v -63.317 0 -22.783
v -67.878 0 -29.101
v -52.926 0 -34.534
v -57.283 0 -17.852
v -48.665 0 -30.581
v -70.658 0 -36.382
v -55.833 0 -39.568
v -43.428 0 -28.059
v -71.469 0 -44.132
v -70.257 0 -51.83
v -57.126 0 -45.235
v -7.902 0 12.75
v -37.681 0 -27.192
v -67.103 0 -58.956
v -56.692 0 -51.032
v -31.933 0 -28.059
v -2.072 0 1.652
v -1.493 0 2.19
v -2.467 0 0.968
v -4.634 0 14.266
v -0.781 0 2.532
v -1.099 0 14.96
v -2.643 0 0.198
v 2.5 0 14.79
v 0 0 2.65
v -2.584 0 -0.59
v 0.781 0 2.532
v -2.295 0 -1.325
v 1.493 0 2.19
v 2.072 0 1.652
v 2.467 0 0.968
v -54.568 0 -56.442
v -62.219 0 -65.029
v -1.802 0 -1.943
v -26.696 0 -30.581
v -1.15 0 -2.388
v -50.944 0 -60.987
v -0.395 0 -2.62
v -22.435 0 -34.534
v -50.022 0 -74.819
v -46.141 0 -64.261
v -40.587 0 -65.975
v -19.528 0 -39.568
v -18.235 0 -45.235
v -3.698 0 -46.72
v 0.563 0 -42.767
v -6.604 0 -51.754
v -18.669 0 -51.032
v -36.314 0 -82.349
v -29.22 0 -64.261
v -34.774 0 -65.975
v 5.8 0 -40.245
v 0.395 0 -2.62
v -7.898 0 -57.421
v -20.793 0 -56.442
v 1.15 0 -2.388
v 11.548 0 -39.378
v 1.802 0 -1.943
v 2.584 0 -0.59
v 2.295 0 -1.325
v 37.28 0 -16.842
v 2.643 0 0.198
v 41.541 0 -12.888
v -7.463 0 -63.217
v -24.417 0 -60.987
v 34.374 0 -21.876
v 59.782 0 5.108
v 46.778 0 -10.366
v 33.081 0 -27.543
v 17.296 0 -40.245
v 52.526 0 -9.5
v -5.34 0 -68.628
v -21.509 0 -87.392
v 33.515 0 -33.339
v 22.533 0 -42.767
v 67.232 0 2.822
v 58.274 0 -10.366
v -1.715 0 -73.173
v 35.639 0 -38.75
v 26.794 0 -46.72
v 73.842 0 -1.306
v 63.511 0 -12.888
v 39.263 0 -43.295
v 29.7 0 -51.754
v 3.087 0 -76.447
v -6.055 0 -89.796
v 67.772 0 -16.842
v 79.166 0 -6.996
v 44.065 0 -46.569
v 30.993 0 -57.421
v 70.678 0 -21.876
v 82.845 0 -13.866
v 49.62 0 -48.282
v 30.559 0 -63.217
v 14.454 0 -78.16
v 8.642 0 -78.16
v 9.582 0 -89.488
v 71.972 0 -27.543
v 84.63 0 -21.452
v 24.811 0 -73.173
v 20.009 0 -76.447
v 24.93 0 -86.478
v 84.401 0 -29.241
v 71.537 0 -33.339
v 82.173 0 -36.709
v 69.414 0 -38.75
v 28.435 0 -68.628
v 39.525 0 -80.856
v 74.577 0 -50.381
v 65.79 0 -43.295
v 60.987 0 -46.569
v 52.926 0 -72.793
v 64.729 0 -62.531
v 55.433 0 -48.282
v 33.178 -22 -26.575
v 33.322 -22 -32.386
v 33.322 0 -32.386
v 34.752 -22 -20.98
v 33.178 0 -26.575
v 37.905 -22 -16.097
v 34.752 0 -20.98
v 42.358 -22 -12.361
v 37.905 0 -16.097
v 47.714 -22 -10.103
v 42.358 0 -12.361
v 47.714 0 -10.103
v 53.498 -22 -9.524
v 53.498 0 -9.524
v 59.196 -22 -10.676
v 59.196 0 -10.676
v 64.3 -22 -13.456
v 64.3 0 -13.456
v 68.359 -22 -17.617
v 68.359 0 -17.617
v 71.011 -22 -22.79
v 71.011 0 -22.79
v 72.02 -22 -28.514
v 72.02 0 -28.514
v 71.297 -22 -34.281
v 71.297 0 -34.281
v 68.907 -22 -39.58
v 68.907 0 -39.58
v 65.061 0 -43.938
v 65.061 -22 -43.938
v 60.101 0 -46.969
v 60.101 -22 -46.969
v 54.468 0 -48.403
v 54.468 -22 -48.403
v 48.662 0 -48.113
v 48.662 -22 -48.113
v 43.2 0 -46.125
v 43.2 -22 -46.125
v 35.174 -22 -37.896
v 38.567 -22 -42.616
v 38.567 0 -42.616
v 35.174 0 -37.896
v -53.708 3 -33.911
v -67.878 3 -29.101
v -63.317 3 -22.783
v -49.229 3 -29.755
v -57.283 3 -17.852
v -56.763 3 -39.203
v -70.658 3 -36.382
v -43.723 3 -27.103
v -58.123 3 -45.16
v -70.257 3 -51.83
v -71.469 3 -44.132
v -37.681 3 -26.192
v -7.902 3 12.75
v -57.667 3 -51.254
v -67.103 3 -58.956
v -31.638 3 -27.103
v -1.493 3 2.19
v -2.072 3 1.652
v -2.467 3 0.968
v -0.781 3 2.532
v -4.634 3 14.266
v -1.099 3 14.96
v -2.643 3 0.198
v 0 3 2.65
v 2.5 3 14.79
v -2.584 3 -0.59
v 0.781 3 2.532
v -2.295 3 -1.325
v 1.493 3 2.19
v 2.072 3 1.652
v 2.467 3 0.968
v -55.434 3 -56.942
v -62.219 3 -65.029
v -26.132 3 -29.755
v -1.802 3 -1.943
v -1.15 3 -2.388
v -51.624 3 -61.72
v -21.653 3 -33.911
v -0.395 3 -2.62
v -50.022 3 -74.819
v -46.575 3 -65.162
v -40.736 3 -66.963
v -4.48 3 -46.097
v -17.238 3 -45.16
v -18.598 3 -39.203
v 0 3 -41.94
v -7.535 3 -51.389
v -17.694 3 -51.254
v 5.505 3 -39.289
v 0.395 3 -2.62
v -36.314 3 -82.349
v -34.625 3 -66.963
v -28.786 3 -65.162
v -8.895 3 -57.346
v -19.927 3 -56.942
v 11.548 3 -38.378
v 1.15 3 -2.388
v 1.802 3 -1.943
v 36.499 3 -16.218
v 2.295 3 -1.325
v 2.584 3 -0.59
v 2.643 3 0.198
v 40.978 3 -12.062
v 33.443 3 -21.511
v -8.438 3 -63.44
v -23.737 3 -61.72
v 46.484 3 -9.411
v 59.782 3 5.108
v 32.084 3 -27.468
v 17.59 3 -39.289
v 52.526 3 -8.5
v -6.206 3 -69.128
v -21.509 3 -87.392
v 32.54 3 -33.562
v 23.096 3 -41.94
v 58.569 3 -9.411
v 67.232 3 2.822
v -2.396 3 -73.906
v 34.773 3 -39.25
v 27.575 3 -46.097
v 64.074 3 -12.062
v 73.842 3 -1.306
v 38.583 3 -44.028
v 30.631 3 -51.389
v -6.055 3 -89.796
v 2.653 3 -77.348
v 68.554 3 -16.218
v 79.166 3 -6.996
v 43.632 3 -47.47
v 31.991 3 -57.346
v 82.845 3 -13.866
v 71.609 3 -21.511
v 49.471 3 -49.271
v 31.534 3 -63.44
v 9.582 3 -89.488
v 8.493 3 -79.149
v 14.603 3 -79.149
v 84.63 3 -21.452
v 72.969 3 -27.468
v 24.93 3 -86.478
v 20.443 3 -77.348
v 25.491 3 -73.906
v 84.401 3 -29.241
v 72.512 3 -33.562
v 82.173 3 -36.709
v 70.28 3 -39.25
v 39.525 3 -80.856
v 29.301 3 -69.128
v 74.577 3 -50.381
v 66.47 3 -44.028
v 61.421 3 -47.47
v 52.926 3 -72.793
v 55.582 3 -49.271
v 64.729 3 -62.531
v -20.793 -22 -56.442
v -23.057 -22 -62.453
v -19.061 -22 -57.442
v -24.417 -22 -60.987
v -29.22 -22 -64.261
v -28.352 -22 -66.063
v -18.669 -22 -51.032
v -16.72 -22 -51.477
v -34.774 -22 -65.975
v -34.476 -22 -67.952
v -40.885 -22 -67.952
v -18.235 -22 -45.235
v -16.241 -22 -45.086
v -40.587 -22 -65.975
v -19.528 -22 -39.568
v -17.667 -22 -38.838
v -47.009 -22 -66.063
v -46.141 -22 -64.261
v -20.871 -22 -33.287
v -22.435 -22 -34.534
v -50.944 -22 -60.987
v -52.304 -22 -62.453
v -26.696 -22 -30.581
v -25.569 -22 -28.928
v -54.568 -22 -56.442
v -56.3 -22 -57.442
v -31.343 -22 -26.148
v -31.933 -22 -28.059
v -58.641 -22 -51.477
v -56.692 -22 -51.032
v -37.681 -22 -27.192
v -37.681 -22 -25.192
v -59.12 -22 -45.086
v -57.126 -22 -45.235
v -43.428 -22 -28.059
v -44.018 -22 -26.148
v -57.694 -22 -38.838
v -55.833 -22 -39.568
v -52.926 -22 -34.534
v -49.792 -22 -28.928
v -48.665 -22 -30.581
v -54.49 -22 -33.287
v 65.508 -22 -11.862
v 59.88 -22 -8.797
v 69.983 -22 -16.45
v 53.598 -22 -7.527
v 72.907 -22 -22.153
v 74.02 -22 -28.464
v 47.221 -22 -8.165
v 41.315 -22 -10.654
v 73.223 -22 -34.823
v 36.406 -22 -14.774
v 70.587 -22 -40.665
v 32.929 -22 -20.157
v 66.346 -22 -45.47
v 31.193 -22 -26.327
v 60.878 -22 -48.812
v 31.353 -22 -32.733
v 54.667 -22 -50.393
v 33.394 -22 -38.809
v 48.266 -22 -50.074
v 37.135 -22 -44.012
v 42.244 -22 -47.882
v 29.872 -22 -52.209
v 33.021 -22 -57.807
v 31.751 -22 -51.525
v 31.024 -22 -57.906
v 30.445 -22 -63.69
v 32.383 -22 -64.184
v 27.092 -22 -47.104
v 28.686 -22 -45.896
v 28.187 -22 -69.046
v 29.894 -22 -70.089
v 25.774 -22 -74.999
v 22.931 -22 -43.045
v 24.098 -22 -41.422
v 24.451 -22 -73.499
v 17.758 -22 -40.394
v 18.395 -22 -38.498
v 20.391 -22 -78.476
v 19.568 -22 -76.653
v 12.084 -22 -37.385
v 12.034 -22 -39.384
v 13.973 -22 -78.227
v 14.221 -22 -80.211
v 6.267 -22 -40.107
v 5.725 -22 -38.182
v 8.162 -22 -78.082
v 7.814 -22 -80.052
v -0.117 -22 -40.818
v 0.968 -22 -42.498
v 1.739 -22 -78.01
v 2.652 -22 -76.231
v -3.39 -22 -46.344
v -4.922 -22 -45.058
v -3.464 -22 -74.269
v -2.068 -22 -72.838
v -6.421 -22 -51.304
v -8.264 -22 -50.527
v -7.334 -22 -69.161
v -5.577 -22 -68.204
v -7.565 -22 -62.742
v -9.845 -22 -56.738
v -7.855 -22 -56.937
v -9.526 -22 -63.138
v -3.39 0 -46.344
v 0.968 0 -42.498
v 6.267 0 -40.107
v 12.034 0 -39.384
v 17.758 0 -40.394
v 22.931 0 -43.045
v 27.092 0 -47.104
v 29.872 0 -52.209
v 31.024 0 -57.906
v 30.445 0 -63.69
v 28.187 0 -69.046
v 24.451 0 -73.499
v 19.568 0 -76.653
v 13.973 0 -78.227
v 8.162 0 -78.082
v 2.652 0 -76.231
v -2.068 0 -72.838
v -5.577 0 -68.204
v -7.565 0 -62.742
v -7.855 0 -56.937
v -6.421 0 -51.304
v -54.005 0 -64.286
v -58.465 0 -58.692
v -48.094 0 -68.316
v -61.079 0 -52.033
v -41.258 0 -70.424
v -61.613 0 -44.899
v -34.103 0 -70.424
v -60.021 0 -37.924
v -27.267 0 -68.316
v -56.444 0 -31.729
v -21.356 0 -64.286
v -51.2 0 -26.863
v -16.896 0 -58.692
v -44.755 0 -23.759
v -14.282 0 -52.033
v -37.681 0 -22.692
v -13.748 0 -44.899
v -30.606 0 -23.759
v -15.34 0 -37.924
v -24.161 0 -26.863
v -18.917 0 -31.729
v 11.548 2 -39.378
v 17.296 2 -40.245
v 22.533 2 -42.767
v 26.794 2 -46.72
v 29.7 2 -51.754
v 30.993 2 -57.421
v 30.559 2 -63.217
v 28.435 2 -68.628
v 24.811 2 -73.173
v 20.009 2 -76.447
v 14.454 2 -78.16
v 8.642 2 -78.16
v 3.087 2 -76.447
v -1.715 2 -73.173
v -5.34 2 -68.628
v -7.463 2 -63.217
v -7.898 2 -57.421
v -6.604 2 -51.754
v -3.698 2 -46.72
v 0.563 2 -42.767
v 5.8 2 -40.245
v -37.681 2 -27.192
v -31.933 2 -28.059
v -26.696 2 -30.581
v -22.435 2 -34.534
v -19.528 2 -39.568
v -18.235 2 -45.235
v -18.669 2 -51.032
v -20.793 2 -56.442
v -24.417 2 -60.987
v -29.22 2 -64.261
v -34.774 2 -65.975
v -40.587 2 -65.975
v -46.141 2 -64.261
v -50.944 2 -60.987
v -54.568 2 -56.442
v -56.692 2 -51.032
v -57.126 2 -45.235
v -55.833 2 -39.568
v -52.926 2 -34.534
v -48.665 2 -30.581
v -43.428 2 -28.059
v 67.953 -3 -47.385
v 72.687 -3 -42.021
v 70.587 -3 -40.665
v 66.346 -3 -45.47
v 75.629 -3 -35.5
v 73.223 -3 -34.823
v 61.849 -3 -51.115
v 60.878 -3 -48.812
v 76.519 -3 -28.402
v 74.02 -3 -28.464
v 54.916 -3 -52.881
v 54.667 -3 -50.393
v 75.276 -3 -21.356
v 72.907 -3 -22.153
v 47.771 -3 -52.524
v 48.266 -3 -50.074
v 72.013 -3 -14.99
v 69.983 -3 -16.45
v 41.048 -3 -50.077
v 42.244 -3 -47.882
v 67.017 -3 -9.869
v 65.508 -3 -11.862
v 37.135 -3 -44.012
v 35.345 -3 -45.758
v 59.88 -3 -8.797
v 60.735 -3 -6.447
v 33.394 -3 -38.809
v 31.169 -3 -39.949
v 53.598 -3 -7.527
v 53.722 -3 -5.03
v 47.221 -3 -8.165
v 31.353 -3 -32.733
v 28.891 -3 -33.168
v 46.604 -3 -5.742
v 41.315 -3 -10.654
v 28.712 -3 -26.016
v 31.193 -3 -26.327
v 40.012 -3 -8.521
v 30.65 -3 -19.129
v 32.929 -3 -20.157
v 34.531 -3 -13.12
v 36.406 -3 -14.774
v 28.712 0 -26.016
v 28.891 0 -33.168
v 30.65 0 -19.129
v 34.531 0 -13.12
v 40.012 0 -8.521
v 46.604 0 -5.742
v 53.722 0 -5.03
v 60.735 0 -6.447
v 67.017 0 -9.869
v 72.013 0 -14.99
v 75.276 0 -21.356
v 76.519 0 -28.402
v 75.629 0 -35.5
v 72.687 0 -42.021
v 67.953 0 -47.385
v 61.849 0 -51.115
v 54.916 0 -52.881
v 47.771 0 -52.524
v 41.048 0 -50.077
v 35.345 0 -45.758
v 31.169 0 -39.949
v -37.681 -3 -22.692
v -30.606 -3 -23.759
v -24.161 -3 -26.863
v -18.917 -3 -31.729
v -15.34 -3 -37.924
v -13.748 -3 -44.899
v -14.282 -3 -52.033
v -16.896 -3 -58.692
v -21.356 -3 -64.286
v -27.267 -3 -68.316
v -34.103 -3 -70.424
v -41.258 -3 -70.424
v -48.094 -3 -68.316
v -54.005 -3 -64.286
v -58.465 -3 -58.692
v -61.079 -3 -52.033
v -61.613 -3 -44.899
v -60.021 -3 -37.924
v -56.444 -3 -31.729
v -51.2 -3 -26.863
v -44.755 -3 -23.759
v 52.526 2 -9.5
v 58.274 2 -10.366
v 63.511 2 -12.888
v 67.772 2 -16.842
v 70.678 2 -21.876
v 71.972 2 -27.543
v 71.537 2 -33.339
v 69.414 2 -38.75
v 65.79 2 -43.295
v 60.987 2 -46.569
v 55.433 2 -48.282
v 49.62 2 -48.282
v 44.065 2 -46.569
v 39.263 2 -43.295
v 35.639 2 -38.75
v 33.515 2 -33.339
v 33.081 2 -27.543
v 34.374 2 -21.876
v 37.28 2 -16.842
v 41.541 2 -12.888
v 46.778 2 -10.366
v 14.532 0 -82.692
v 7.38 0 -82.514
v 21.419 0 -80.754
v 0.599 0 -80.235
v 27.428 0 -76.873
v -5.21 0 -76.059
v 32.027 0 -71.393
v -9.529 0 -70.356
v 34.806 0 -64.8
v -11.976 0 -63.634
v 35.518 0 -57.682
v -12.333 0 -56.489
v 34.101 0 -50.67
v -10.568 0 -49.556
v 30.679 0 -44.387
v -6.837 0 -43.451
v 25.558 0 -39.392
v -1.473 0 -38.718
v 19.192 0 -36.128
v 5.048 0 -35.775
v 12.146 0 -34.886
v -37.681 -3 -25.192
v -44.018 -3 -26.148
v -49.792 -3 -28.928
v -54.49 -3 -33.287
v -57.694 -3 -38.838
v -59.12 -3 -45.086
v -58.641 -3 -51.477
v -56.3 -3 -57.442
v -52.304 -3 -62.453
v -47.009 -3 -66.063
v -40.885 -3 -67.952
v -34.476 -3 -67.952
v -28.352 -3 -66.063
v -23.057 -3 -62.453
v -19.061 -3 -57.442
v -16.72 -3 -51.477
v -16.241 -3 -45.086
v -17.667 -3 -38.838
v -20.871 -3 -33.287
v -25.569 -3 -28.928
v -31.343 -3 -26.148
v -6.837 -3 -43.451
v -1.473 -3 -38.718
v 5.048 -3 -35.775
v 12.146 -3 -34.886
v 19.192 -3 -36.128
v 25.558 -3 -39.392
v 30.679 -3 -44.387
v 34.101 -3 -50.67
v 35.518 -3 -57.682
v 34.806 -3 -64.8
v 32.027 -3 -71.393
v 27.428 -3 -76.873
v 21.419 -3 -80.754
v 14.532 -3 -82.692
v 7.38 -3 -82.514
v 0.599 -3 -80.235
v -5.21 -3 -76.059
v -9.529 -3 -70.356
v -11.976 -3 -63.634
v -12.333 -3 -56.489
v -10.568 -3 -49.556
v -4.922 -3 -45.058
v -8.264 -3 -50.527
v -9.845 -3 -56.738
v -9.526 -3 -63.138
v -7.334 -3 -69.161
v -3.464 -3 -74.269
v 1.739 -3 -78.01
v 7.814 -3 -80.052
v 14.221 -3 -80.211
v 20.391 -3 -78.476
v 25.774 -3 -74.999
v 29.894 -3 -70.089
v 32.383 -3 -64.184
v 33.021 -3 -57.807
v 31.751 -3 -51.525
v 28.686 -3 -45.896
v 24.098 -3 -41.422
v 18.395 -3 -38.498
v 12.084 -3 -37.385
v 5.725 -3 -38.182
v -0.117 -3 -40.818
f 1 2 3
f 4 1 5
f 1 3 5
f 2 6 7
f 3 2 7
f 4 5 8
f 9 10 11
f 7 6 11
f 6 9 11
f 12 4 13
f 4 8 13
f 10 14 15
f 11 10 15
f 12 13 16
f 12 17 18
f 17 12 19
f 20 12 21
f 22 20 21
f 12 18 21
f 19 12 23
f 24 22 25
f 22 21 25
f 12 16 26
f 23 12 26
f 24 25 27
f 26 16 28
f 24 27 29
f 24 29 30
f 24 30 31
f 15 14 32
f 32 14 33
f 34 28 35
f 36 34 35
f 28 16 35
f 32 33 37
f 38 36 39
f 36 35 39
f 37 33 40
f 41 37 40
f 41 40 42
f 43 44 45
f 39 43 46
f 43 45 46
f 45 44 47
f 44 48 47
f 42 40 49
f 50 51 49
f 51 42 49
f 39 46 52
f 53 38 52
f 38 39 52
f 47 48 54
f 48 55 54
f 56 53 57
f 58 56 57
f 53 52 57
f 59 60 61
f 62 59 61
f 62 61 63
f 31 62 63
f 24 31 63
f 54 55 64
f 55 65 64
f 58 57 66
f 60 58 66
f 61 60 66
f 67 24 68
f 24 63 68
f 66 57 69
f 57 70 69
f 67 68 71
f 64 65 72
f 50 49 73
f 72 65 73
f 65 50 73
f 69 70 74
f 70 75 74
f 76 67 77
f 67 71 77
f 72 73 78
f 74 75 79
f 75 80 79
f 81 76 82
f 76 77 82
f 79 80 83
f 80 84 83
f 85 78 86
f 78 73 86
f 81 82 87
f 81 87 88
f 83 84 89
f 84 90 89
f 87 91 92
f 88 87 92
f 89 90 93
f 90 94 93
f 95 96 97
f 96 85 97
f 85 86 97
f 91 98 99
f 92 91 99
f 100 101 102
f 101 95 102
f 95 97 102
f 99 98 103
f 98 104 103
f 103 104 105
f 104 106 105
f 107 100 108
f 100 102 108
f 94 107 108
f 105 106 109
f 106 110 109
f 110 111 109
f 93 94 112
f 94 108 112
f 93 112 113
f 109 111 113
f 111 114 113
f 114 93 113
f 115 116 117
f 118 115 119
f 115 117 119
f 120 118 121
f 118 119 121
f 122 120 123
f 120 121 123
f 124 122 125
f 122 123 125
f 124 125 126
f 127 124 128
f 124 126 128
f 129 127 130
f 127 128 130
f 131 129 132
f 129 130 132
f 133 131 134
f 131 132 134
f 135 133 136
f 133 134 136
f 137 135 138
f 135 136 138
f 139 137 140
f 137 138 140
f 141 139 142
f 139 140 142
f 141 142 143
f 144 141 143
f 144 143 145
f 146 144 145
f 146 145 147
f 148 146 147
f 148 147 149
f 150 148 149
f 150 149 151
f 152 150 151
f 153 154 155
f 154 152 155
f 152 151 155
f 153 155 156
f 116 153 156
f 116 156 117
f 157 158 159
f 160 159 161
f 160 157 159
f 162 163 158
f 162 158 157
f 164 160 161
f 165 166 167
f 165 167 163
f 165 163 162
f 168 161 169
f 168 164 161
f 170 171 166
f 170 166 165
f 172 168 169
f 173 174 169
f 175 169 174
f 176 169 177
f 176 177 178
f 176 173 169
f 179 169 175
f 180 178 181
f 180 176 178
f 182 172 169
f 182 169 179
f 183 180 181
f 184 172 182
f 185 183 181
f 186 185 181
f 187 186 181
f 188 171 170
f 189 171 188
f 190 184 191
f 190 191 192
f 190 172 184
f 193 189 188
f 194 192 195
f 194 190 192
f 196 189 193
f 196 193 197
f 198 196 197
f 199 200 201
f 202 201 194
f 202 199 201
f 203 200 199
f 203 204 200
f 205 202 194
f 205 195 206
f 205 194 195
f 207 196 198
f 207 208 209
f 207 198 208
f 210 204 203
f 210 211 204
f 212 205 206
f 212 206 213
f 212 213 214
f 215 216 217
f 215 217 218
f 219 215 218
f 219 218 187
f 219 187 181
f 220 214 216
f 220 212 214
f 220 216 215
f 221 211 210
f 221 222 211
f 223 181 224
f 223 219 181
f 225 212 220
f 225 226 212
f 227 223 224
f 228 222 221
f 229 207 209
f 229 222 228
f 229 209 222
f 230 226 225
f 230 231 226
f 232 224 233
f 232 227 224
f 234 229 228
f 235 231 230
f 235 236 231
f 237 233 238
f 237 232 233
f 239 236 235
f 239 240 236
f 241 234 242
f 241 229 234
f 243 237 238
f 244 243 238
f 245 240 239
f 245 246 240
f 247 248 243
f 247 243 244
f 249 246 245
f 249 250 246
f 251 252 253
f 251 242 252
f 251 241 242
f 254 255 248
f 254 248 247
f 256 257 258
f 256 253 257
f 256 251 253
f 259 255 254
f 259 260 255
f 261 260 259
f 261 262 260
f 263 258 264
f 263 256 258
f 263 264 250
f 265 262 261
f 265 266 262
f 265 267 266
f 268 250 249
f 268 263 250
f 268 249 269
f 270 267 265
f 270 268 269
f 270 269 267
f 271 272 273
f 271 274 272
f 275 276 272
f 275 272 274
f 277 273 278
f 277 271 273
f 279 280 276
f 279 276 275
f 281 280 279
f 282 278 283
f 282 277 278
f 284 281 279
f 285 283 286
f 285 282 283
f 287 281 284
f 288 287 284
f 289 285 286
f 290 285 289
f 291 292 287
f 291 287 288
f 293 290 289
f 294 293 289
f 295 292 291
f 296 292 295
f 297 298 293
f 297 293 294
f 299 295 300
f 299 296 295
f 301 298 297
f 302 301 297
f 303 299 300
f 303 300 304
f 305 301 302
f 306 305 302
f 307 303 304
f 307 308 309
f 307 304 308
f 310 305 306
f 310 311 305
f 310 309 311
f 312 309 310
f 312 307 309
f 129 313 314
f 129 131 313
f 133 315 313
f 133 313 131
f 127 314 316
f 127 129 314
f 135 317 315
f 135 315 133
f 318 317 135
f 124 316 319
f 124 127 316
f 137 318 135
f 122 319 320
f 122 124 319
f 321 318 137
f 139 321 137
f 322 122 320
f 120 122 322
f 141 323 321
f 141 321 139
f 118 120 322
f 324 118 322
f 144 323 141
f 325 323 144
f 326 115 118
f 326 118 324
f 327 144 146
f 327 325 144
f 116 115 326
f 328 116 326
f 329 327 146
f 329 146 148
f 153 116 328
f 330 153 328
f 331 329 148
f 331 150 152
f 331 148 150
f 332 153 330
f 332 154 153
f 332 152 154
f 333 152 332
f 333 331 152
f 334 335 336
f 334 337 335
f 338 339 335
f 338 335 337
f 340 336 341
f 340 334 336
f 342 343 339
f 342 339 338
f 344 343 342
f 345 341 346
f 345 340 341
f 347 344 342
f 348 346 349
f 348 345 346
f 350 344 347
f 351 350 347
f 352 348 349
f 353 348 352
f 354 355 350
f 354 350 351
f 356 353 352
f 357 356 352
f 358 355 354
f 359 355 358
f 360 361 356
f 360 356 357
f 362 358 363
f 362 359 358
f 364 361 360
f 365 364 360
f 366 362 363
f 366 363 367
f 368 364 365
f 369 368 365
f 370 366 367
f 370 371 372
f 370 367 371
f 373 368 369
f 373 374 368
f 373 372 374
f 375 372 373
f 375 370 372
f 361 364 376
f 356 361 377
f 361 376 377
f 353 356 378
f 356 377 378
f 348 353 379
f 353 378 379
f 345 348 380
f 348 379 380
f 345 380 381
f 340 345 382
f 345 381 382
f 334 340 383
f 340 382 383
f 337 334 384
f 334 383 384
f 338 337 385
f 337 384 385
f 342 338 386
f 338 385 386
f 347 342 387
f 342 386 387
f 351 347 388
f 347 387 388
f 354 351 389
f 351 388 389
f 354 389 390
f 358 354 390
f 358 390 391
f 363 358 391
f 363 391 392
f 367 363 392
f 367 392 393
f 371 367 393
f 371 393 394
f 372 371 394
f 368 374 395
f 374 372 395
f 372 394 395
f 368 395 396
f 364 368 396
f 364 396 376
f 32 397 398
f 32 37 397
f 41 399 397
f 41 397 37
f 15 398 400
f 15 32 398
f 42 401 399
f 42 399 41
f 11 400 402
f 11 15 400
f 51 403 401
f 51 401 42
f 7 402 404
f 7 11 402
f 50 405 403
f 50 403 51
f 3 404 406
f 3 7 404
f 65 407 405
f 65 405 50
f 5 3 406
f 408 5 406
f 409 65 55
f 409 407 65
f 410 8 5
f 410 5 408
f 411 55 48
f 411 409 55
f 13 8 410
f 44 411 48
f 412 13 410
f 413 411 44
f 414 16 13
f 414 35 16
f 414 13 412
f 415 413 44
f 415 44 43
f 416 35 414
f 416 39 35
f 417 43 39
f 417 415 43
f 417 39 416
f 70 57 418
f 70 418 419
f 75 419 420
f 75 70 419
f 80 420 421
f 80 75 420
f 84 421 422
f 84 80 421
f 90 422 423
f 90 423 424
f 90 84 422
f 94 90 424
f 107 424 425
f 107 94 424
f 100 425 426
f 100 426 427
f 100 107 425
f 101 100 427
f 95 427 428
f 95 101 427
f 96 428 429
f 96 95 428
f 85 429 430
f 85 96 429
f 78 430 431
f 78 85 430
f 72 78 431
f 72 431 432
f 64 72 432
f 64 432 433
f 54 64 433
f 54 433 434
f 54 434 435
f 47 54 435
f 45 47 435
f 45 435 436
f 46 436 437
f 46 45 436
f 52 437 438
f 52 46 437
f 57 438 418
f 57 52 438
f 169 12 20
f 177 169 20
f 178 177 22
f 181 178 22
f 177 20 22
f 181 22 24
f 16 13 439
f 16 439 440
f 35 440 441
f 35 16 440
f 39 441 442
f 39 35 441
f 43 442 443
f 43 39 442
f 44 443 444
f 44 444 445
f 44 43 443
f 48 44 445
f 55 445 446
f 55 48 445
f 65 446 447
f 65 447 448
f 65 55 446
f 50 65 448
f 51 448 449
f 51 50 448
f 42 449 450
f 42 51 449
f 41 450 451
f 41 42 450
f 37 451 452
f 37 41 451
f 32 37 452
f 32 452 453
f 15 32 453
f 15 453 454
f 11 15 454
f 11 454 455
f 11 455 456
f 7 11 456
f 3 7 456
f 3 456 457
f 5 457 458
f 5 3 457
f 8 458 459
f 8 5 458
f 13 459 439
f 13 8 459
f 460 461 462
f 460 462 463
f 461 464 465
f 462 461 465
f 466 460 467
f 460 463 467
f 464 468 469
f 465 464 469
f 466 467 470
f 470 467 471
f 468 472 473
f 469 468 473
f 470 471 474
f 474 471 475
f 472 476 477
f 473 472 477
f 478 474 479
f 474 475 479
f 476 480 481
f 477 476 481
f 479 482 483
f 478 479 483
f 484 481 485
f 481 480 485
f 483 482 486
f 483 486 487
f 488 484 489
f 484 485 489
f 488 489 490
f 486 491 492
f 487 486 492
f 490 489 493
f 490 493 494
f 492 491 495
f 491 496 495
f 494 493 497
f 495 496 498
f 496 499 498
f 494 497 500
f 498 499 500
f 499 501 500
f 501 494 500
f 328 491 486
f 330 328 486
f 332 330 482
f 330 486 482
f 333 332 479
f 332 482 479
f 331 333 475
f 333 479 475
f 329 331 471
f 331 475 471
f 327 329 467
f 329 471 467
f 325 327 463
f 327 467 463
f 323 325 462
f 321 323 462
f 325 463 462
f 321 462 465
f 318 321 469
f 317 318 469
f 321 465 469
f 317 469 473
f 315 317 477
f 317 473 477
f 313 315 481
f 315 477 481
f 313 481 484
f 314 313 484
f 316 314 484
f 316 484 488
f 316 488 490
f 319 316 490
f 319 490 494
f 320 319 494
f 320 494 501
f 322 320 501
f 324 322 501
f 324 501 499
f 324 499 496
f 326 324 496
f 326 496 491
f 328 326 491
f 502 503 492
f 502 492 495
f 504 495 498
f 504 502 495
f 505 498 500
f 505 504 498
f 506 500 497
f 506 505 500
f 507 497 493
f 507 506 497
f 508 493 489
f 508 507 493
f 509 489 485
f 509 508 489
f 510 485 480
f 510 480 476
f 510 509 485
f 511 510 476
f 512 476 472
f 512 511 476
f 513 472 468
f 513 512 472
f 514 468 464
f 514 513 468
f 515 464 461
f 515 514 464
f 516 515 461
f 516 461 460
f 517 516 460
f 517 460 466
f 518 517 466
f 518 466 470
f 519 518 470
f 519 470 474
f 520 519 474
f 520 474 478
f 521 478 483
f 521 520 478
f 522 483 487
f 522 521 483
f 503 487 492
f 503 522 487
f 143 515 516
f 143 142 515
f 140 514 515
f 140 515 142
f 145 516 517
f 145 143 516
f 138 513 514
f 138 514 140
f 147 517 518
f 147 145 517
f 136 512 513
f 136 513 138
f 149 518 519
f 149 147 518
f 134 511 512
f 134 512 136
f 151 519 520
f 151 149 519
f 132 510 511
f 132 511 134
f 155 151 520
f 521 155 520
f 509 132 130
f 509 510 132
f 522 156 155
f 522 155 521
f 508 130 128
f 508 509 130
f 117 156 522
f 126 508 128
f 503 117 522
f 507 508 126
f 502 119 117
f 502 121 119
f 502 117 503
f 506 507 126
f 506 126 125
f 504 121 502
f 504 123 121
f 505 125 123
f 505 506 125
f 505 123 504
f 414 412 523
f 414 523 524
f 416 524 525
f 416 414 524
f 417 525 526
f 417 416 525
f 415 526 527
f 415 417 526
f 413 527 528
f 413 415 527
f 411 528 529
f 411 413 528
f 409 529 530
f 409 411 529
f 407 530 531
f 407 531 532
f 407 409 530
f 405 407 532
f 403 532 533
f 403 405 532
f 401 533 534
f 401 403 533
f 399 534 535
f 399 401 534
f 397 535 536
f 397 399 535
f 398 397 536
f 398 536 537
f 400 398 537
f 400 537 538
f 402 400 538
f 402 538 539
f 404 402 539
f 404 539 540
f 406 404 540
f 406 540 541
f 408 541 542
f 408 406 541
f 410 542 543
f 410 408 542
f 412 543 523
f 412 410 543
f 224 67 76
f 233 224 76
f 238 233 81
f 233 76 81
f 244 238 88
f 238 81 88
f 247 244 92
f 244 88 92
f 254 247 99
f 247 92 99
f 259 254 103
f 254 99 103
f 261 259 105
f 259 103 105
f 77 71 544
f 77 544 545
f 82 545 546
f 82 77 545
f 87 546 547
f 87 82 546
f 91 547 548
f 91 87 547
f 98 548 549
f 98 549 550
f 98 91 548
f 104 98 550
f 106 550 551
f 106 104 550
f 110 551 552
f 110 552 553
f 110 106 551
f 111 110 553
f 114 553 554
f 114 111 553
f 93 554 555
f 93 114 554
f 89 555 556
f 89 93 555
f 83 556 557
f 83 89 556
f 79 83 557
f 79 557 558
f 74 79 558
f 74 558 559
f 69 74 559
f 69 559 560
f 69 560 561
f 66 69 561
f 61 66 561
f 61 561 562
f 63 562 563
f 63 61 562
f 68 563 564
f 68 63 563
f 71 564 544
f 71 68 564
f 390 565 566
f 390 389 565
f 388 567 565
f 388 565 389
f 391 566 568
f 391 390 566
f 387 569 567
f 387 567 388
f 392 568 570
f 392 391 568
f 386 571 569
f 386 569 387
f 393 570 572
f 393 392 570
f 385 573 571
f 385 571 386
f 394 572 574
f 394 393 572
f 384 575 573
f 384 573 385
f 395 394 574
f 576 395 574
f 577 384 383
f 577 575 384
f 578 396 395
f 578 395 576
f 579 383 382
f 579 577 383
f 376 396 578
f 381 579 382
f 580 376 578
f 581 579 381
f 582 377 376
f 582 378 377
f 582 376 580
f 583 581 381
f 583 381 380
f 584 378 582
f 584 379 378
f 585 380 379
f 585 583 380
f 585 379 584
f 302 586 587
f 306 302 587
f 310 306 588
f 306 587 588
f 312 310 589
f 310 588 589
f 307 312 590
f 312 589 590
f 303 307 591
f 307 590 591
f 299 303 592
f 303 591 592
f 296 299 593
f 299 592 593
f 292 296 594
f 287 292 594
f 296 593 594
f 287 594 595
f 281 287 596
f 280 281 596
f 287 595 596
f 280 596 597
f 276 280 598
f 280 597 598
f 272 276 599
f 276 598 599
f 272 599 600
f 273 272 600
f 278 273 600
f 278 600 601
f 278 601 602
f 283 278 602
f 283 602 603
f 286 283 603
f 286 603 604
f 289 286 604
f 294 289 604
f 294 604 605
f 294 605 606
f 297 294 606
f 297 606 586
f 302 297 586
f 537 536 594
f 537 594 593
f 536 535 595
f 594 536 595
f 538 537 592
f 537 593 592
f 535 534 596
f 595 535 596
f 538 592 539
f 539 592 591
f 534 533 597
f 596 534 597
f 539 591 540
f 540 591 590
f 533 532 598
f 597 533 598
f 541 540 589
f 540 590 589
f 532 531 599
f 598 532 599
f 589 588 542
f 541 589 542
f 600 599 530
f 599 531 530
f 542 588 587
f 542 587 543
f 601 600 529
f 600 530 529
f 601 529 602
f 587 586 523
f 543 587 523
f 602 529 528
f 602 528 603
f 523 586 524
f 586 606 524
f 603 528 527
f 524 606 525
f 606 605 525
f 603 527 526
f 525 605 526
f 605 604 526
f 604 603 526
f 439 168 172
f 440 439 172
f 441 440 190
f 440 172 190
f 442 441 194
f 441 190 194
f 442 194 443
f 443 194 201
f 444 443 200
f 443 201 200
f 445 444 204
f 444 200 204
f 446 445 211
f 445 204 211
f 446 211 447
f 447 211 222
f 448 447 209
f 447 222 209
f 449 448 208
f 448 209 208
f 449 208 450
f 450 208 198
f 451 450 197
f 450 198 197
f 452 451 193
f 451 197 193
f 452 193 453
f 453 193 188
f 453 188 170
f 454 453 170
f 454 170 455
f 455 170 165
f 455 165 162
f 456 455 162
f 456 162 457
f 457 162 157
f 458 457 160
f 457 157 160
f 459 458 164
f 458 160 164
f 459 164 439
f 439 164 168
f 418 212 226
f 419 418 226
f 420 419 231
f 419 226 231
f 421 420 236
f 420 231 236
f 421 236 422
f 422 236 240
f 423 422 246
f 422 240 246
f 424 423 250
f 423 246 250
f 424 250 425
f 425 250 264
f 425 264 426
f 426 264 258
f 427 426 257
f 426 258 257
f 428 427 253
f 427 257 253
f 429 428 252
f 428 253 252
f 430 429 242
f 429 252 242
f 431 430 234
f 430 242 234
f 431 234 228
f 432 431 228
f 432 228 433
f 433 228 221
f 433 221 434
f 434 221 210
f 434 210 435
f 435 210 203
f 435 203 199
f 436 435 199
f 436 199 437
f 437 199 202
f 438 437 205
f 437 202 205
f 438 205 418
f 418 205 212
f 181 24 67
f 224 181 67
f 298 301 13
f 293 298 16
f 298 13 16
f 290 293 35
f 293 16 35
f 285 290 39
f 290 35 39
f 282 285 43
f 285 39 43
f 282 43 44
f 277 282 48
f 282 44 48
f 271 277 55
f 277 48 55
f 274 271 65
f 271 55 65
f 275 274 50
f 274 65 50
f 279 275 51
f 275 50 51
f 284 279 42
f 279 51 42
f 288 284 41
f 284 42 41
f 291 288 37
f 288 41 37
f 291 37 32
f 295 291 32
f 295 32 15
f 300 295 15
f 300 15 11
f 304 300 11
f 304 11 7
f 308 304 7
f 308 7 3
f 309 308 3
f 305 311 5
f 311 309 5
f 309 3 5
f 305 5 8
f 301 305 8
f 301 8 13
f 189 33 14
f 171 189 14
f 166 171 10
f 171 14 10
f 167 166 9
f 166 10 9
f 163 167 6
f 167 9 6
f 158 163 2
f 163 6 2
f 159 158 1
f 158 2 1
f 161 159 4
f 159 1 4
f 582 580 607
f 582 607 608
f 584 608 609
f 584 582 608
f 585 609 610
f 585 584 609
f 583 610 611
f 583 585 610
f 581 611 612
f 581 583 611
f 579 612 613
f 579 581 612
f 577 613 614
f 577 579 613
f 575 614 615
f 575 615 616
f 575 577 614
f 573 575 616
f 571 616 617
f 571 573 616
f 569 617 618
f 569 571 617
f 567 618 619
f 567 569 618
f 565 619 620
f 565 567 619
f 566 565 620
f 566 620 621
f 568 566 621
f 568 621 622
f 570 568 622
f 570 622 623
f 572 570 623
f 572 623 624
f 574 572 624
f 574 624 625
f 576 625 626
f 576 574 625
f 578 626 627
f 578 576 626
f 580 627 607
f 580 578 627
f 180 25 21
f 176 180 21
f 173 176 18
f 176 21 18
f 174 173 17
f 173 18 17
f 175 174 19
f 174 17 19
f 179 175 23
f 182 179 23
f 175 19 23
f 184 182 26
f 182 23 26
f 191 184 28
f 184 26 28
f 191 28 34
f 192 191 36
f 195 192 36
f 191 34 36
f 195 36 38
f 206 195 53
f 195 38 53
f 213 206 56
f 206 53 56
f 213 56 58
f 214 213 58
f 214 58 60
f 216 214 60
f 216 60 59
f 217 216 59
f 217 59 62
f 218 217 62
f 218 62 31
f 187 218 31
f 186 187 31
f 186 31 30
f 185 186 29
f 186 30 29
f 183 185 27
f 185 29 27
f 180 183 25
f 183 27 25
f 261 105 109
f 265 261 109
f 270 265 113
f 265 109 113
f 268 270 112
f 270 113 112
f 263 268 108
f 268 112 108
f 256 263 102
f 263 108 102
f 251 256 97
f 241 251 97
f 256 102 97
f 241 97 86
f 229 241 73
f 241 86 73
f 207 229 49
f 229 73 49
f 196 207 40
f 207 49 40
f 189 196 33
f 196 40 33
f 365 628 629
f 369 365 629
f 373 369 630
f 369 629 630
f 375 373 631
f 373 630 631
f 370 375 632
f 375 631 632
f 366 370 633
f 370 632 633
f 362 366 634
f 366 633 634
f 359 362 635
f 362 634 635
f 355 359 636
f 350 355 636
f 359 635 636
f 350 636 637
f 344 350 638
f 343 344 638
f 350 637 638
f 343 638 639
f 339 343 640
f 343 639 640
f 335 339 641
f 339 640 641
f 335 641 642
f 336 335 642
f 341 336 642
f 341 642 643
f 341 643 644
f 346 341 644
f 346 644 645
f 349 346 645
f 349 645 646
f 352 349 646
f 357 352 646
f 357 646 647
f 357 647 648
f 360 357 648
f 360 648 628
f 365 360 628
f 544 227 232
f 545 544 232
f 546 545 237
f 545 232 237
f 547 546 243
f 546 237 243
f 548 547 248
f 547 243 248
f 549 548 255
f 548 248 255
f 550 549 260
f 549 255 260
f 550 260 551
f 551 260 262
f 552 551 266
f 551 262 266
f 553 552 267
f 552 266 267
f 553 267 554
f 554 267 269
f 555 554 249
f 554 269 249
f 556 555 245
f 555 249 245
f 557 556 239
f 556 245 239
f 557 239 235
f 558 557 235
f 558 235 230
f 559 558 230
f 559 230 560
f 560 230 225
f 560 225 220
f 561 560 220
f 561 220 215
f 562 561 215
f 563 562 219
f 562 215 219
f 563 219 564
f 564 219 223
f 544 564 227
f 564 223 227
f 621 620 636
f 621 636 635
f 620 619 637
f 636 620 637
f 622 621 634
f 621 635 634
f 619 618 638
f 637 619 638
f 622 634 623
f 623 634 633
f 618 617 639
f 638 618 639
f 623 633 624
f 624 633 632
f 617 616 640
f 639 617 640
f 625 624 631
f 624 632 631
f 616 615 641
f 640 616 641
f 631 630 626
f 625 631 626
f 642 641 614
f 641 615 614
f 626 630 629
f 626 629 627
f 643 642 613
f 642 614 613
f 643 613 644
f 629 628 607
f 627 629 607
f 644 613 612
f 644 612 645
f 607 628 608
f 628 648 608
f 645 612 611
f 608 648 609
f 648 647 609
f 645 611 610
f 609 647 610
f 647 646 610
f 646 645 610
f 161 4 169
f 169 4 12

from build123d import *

# Parameters (mm, degrees)
SKETCH1_R           = 19.5
SKETCH1_R_2         = 1
BOSS_EXTRUDE1_DEPTH = 3
SKETCH2_R           = 24
SKETCH2_R_2         = 19.5
BOSS_EXTRUDE2_DEPTH = 3
SKETCH3_R           = 21.5
SKETCH3_R_2         = 19.5
BOSS_EXTRUDE3_DEPTH = 22
CIRPATTERN1_COUNT   = 3
CIRPATTERN1_ANGLE   = 100
CHAMFER1_SIZE       = 1
SKETCH5_W           = 2.65
SKETCH5_H           = 25


with BuildPart() as part:
    # Sketch1 → Boss-Extrude1 (new body)
    with BuildSketch(Plane(origin=(0, 0, 0), x_dir=(1, 0, 0), z_dir=(0, 1, 0))):
        with BuildLine():
            Line((-57.282568216, 17.852377392), (-7.901533034, -12.750128459))
            ThreePointArc((-7.901533034, -12.750128459), (-2.886972844, -14.719558003), (2.5, -14.790199458))
            Line((2.5, -14.790199458), (59.782196187, -5.107741092))
            ThreePointArc((59.782196187, -5.107741092), (81.229417033, 10.311283966), (82.17329428, 36.708986735))
            ThreePointArc((82.17329428, 36.708986735), (17.321837062, 88.317348017), (-62.219253222, 65.028951464))
            ThreePointArc((-62.219253222, 65.028951464), (-71.316587402, 40.230400567), (-57.282568216, 17.852377392))
        make_face()
        with Locations(Location((-37.680500959, 46.692396034, 0), (0, 0, 270))):
            Circle(SKETCH1_R, mode=Mode.SUBTRACT)
        with Locations(Location((11.547891375, 58.878232012, 0), (0, 0, 270))):
            Circle(SKETCH1_R, mode=Mode.SUBTRACT)
        with Locations(Location((52.526183947, 29, 0), (0, 0, 270))):
            Circle(SKETCH1_R, mode=Mode.SUBTRACT)
        with Locations(Location((0, 0, 0), (0, 0, 270))):
            Circle(SKETCH1_R_2, mode=Mode.SUBTRACT)
    extrude(amount=BOSS_EXTRUDE1_DEPTH)

    # Chamfer1
    chamfer1_edges = [part.edges().sort_by_distance(p)[0] for p in [
        (-37.680500959, 3, -66.192396034),
        (11.547891375, 3, -78.378232012),
        (52.526183947, 3, -48.5),
    ]]
    chamfer(chamfer1_edges, length=CHAMFER1_SIZE)

    # Sketch5 → M5 Clearance Hole1 (revolve, cut)
    with BuildSketch(Plane(origin=(0, 3, 0), x_dir=(0, 0, 1), z_dir=(1, 0, 0))):
        with Locations((1.325, 12.5)):
            Rectangle(SKETCH5_W, SKETCH5_H)
    revolve(axis=Axis((0, 9.35, 0), (0, -1, 0)), mode=Mode.SUBTRACT)


with BuildPart() as body_2:
    # Sketch2 → Boss-Extrude2 (new body)
    with BuildSketch(Plane(origin=(0, 0, 0), x_dir=(1, 0, 0), z_dir=(0, 1, 0))):
        with Locations(Location((-37.680500959, 46.692396034, 0), (0, 0, 270))):
            Circle(SKETCH2_R)
        with Locations(Location((-37.680500959, 46.692396034, 0), (0, 0, 270))):
            Circle(SKETCH2_R_2, mode=Mode.SUBTRACT)
    extrude(amount=-BOSS_EXTRUDE2_DEPTH)

    # Sketch3 → Boss-Extrude3 (add)
    with BuildSketch(Plane(origin=(0, 0, 0), x_dir=(-1, 0, 0), z_dir=(0, -1, 0))):
        with Locations(Location((37.680500959, 46.692396034, 0), (0, 0, 270))):
            Circle(SKETCH3_R)
        with Locations(Location((37.680500959, 46.692396034, 0), (0, 0, 270))):
            Circle(SKETCH3_R_2, mode=Mode.SUBTRACT)
    extrude(amount=BOSS_EXTRUDE3_DEPTH)


with BuildPart() as cirpattern1_1:
    # CirPattern1: pattern copy
    add(body_2.part.rotate(Axis((0, 0, 0), (0, -1, 0)), 1 * CIRPATTERN1_ANGLE / (CIRPATTERN1_COUNT - 1)))


with BuildPart() as cirpattern1_2:
    # CirPattern1: pattern copy
    add(body_2.part.rotate(Axis((0, 0, 0), (0, -1, 0)), 2 * CIRPATTERN1_ANGLE / (CIRPATTERN1_COUNT - 1)))


solid = Compound([part.part, body_2.part, cirpattern1_1.part, cirpattern1_2.part])
